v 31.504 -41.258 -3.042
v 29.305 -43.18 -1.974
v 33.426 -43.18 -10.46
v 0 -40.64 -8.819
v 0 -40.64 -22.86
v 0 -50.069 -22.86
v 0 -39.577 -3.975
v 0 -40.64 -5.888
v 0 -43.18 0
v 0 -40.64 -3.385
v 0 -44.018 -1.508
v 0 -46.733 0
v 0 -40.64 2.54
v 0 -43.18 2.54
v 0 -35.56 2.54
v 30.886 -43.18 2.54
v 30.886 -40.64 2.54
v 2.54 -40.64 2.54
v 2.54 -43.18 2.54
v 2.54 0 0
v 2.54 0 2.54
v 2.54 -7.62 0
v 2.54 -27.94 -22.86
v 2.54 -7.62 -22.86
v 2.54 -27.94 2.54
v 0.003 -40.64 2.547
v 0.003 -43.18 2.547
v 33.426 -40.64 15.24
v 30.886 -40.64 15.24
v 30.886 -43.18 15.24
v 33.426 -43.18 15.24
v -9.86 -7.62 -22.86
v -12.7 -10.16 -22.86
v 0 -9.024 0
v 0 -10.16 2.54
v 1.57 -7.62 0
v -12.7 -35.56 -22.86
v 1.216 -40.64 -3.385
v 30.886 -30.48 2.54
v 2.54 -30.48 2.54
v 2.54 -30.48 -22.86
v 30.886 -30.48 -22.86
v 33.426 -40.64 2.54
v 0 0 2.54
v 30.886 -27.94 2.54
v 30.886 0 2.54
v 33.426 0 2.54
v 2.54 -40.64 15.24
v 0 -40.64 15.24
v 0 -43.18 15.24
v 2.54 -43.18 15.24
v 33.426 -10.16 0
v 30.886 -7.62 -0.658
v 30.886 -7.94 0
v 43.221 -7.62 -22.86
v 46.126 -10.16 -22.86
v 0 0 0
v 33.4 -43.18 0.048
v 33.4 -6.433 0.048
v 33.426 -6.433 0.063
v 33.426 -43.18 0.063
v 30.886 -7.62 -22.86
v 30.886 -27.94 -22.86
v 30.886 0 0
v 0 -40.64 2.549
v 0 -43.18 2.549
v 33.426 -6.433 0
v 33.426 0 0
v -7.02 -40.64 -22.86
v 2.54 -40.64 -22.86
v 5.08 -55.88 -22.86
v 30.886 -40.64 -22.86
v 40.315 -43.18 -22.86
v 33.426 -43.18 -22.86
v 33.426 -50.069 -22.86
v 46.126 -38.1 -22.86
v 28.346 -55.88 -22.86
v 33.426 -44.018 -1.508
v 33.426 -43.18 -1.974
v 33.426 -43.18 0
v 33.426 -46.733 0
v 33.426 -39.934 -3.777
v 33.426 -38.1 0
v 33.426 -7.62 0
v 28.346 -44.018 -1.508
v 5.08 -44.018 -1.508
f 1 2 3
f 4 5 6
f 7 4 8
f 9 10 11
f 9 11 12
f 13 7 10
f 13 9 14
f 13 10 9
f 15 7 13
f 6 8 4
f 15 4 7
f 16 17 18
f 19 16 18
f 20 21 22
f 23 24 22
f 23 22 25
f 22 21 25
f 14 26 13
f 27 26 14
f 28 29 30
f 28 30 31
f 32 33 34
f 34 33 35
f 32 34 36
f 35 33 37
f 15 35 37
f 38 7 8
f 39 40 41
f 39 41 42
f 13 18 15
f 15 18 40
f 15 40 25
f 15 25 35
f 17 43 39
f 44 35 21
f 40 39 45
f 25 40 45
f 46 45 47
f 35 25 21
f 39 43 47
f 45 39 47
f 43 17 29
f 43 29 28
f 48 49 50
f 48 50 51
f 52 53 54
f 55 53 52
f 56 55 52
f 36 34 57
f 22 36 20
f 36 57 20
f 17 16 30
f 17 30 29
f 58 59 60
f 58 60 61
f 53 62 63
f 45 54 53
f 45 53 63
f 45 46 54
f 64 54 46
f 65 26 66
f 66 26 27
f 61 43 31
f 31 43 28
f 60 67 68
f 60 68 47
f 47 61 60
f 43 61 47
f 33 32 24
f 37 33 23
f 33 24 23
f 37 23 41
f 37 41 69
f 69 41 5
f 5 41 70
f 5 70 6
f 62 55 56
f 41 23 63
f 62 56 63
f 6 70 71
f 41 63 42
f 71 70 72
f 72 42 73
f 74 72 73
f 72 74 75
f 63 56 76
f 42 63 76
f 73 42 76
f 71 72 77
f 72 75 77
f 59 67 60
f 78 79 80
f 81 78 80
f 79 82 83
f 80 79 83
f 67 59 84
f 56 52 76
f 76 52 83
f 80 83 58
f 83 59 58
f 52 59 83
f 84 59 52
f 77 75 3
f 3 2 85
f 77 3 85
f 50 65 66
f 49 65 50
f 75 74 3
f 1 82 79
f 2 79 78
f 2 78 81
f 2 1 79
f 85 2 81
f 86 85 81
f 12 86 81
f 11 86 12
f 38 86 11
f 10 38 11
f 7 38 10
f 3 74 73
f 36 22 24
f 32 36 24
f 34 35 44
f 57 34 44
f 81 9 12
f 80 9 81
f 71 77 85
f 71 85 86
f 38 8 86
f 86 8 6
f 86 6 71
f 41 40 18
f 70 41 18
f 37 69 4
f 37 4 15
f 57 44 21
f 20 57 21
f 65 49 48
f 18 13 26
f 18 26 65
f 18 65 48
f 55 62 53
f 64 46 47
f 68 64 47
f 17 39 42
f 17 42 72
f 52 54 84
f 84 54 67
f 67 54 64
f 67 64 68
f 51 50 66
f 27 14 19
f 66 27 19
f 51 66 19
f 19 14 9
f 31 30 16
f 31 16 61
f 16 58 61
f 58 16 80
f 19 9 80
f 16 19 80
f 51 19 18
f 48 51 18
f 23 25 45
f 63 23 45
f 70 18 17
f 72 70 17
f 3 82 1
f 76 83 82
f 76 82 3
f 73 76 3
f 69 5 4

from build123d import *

# Parameters (mm, degrees)
F0_W          = 28.3464
F0_H          = 2.54
F0_W_2        = 2.54
F1_DEPTH      = 43.18
F2_W          = 28.3464
F2_H          = 10.16
F3_DEPTH      = 2.54
F2_W_2        = 2.54
F2_H_2        = 2.54
F4_DEPTH      = 12.7
F5_DEPTH      = 25.4
F6_W          = 33.4264
F6_H          = 22.86
F7_DEPTH      = 12.7
F9_W          = 35.56
F9_H          = 27.94
F10_DEPTH     = 25.4
F11_W         = 35.56
F11_H         = 22.86
F12_DEPTH     = 12.7
F14_W         = 36.8241928518
F14_H         = 28.1280204654
F15_DEPTH     = 25.4
F17_DEPTH     = 12.7
F19_W         = 36.3356121816
F19_H         = 38.6965835933
F20_DEPTH     = 25.4
F21_T4_DEPTH  = 37.4897748093
F21_T10_DEPTH = 37.4897748093
F22_T4_DEPTH  = 41.4622128931
F22_T9_DEPTH  = 41.4622128931
F22_T15_DEPTH = 39.215050137
F22_T21_DEPTH = 39.215050137
F22_T26_DEPTH = 13.1188216118
F23_T4_DEPTH  = 41.4622128931
F23_T9_DEPTH  = 41.4622128931
F23_T14_DEPTH = 39.215050137
F24_W         = 28.3464
F24_H         = 2.54
F25_DEPTH     = 25.4


# Not quite as in the source:
# - a fillet or chamfer that OpenCascade refuses, or shapes differently, is made with other operations: its cross-section is extruded or revolved along the edge and cut away or added


with BuildPart() as f1:
    # F0 (on Front) → F1 (new body)
    with BuildSketch(Plane.XZ):
        with Locations((16.7132, 1.27)):
            Rectangle(F0_W, F0_H)
        with Locations((1.27, 1.27)):
            Rectangle(F0_W_2, F0_H)
        with Locations((32.1564, 1.27)):
            Rectangle(F0_W_2, F0_H)
    extrude(amount=F1_DEPTH)

    # F2 (on face) → F3 (cut)
    with BuildSketch(Plane.XY.offset(2.54)):
        Polygon((30.8864, 0), (2.54, 0), (2.54, -7.62), (2.54, -27.94), (30.8864, -27.94), (30.8864, -7.62), align=None)
        with Locations((16.7132, -35.56)):
            Rectangle(F2_W, F2_H)
    extrude(amount=-F3_DEPTH, mode=Mode.SUBTRACT)

    # F2 (on face) → F4 (join)
    with BuildSketch(Plane.XY.offset(2.54)):
        with Locations((1.27, -41.91)):
            Rectangle(F2_W_2, F2_H_2)
        with Locations((32.1564, -41.91)):
            Rectangle(F2_W_2, F2_H_2)
    extrude(amount=F4_DEPTH)

    # F2 (on face) → F5 (join)
    with BuildSketch(Plane.XY.offset(2.54)):
        Polygon((2.54, -7.62), (0, -7.62), (0, -40.64), (2.54, -40.64), (2.54, -30.48), (2.54, -27.94), align=None)
        Polygon((33.4264, -7.62), (30.8864, -7.62), (30.8864, -27.94), (30.8864, -30.48), (30.8864, -40.64), (33.4264, -40.64), align=None)
        with Locations((16.7132, -41.91)):
            Rectangle(F2_W, F2_H_2)
        with Locations((1.27, -41.91)):
            Rectangle(F2_W_2, F2_H_2)
        with Locations((32.1564, -41.91)):
            Rectangle(F2_W_2, F2_H_2)
    extrude(amount=-F5_DEPTH)

    # F6 (on face) → F7 (join)
    with BuildSketch(Plane.XZ.offset(43.18)):
        with Locations((16.7132, -11.43)):
            Rectangle(F6_W, F6_H)
    extrude(amount=F7_DEPTH)

    # F9 (on 3pt) → F10 (cut)
    with BuildSketch(Plane(origin=(0, -32.9960377358, 18.3311320755), x_dir=(-1, 0, 0), z_dir=(0, 0.8741572761, -0.4856429312))):
        with Locations((-17.78, -36.665337096)):
            Rectangle(F9_W, F9_H)
    extrude(amount=-F10_DEPTH, mode=Mode.SUBTRACT)

    # F11 (on face) → F12 (join)
    with BuildSketch(Plane.YZ.offset(33.4264)):
        with Locations((-25.4, -11.43)):
            Rectangle(F11_W, F11_H)
    extrude(amount=F12_DEPTH)

    # F14 (on 3pt) → F15 (cut)
    with BuildSketch(Plane(origin=(25.5428150943, 0, 14.1904528302), x_dir=(0, -1, 0), z_dir=(-0.8741572761, 0, -0.4856429312))):
        with Locations((24.8448457569, -30.2426330745)):
            Rectangle(F14_W, F14_H)
    extrude(amount=-F15_DEPTH, mode=Mode.SUBTRACT)

    # F16 (on face) → F17 (join)
    with BuildSketch(Plane(origin=(0, 0, 0), x_dir=(0, -1, 0), z_dir=(-1, 0, 0))):
        Polygon((40.64, -22.86), (40.64, 2.54), (7.62, 2.54), (7.62, 0), (7.62, -22.86), align=None)
    extrude(amount=F17_DEPTH)

    # F19 (on 3pt) → F20 (cut)
    with BuildSketch(Plane(origin=(-1.016, 0, 0.508), x_dir=(0, -1, 0), z_dir=(-0.894427191, 0, 0.4472135955))):
        with Locations((25.5430552643, -17.0687864302)):
            Rectangle(F19_W, F19_H)
    extrude(amount=F20_DEPTH, mode=Mode.SUBTRACT)

    # F21: chamfer of 5.08 on 2 edges, made by hand


with BuildPart() as f21_tool2:
    # F21_s3 → F21_t4 (new body)
    with BuildSketch(Plane(origin=(0, -29.228474159, -52.6112534862), x_dir=(1, 0, 0), z_dir=(0, 0.4856429312, 0.8741572761))):
        with BuildLine():
            Line((-0.1436840979, -32.522427085), (5.2236840979, -37.8897952809))
            Line((5.2236840979, -37.8897952809), (5.2236840979, -37.9913952809))
            ThreePointArc((5.2236840979, -37.9913952809), (2.611842049, -37.8477111829), (0, -37.8477111829))
            Line((0, -37.8477111829), (-0.1016, -37.7461111829))
            ThreePointArc((-0.1016, -37.7461111829), (-0.1016, -35.134269134), (-0.2452840979, -32.522427085))
            Line((-0.2452840979, -32.522427085), (-0.1436840979, -32.522427085))
        make_face()
    extrude(amount=F21_T4_DEPTH)

    split(bisect_by=Plane.XY.offset(-22.86), keep=Keep.TOP)

    split(bisect_by=Plane.XZ.offset(40.64), keep=Keep.TOP)


with BuildPart() as f1_1:
    add(f1.part)

    # F21_t1: cut F21_tool2
    add(f21_tool2.part, mode=Mode.SUBTRACT)


with BuildPart() as f21_tool8:
    # F21_s9 → F21_t10 (new body)
    with BuildSketch(Plane(origin=(0, -11.0218300314, -19.8392940565), x_dir=(1, 0, 0), z_dir=(0, -0.4856429312, -0.8741572761))):
        with BuildLine():
            Line((33.5700840979, 32.522427085), (28.2027159021, 37.8897952809))
            Line((28.2027159021, 37.8897952809), (28.2027159021, 37.9913952809))
            ThreePointArc((28.2027159021, 37.9913952809), (30.814557951, 37.8477111829), (33.4264, 37.8477111829))
            Line((33.4264, 37.8477111829), (33.528, 37.7461111829))
            ThreePointArc((33.528, 37.7461111829), (33.528, 35.134269134), (33.6716840979, 32.522427085))
            Line((33.6716840979, 32.522427085), (33.5700840979, 32.522427085))
        make_face()
    extrude(amount=F21_T10_DEPTH)

    split(bisect_by=Plane.XZ.offset(43.18), keep=Keep.TOP)

    split(bisect_by=Plane.XY.offset(-22.86), keep=Keep.TOP)


with BuildPart() as f1_2:
    add(f1_1.part)

    # F21_t7: cut F21_tool8
    add(f21_tool8.part, mode=Mode.SUBTRACT)

    # F22: chamfer of 5.08 on 2 edges, made by hand


with BuildPart() as f22_tool2:
    # F22_s3 → F22_t4 (new body)
    with BuildSketch(Plane(origin=(-17.5264653053, 0, -35.0529306106), x_dir=(0, 1, 0), z_dir=(0.4472135955, 0, 0.894427191))):
        Polygon((-40.64, -3.9440774674), (-35.56, 1.1359225326), (-40.64, 1.1359225326), align=None)
    extrude(amount=F22_T4_DEPTH)

    split(bisect_by=Plane.YZ, keep=Keep.BOTTOM)


with BuildPart() as f1_3:
    add(f1_2.part)

    # F22_t1: cut F22_tool2
    add(f22_tool2.part, mode=Mode.SUBTRACT)


with BuildPart() as f22_tool7:
    # F22_s8 → F22_t9 (new body)
    with BuildSketch(Plane(origin=(-17.5264653053, 0, -35.0529306106), x_dir=(0, 1, 0), z_dir=(0.4472135955, 0, 0.894427191))):
        Polygon((-40.64, -3.9440774674), (-35.56, 1.1359225326), (-40.64, 1.1359225326), align=None)
    extrude(amount=F22_T9_DEPTH)

    split(bisect_by=Plane(origin=(-16.3330555915, -14.2776593863, 7.9320329924), x_dir=(0.6581451817, -0.7528910411, 0), z_dir=(-0.7071067812, -0.6181225378, 0.3434014099)), keep=Keep.TOP)

    split(bisect_by=Plane(origin=(0, -11.0218300314, -19.8392940565), x_dir=(1, 0, 0), z_dir=(0, -0.4856429312, -0.8741572761)), keep=Keep.TOP)


with BuildPart() as f1_4:
    add(f1_3.part)

    # F22_t6: cut F22_tool7
    add(f22_tool7.part, mode=Mode.SUBTRACT)


with BuildPart() as f22_tool13:
    # F22_s14 → F22_t15 (new body)
    with BuildSketch(Plane(origin=(26.9280968005, 0, -48.4705742409), x_dir=(0, 1, 0), z_dir=(-0.4856429312, 0, 0.8741572761))):
        Polygon((-38.1, -29.2199307745), (-43.18, -24.1399307745), (-43.18, -29.2199307745), align=None)
    extrude(amount=F22_T15_DEPTH)

    split(bisect_by=Plane(origin=(33.0462555918, -28.8876247736, 16.0486804298), x_dir=(0.6581451817, 0.7528910411, 0), z_dir=(0.7071067812, -0.6181225378, 0.3434014099)), keep=Keep.TOP)

    split(bisect_by=Plane(origin=(0, -11.0218300314, -19.8392940565), x_dir=(1, 0, 0), z_dir=(0, -0.4856429312, -0.8741572761)), keep=Keep.TOP)


with BuildPart() as f1_5:
    add(f1_4.part)

    # F22_t12: cut F22_tool13
    add(f22_tool13.part, mode=Mode.SUBTRACT)


with BuildPart() as f22_tool19:
    # F22_s20 → F22_t21 (new body)
    with BuildSketch(Plane(origin=(26.9280968005, 0, -48.4705742409), x_dir=(0, 1, 0), z_dir=(-0.4856429312, 0, 0.8741572761))):
        Polygon((-38.1, -29.2199307745), (-43.18, -24.1399307745), (-43.18, -29.2199307745), align=None)
    extrude(amount=F22_T21_DEPTH)

    split(bisect_by=Plane.YZ.offset(33.4264), keep=Keep.TOP)


with BuildPart() as f1_6:
    add(f1_5.part)

    # F22_t18: cut F22_tool19
    add(f22_tool19.part, mode=Mode.SUBTRACT)


with BuildPart() as f22_tool24:
    # F22_s25 → F22_t26 (new body)
    with BuildSketch(Plane(origin=(1.5125219245, 0, -2.7225394641), x_dir=(0, 1, 0), z_dir=(0.4856429312, 0, -0.8741572761))):
        Polygon((-38.1, 29.2199307745), (-43.18, 24.1399307745), (-43.18, 29.2199307745), align=None)
    extrude(amount=F22_T26_DEPTH)

    split(bisect_by=Plane(origin=(33.0462555918, -28.8876247736, 16.0486804298), x_dir=(0.6581451817, 0.7528910411, 0), z_dir=(0.7071067812, -0.6181225378, 0.3434014099)), keep=Keep.TOP)

    split(bisect_by=Plane(origin=(0, -11.0218300314, -19.8392940565), x_dir=(1, 0, 0), z_dir=(0, -0.4856429312, -0.8741572761)), keep=Keep.TOP)


with BuildPart() as f1_7:
    add(f1_6.part)

    # F22_t23: cut F22_tool24
    add(f22_tool24.part, mode=Mode.SUBTRACT)

    # F23: chamfer of 2.54 on 2 edges, made by hand


with BuildPart() as f23_tool2:
    # F23_s3 → F23_t4 (new body)
    with BuildSketch(Plane(origin=(3.9372326527, 0, 7.8744653053), x_dir=(0, 1, 0), z_dir=(-0.4472135955, 0, -0.894427191))):
        Polygon((-10.16, -1.1359225326), (-7.62, 1.4040774674), (-7.62, -1.1359225326), align=None)
    extrude(amount=F23_T4_DEPTH)

    split(bisect_by=Plane.XY, keep=Keep.BOTTOM)


with BuildPart() as f1_8:
    add(f1_7.part)

    # F23_t1: cut F23_tool2
    add(f23_tool2.part, mode=Mode.SUBTRACT)


with BuildPart() as f23_tool7:
    # F23_s8 → F23_t9 (new body)
    with BuildSketch(Plane(origin=(3.9372326527, 0, 7.8744653053), x_dir=(0, 1, 0), z_dir=(-0.4472135955, 0, -0.894427191))):
        Polygon((-10.16, -1.1359225326), (-7.62, 1.4040774674), (-7.62, -1.1359225326), align=None)
    extrude(amount=F23_T9_DEPTH)

    split(bisect_by=Plane.YZ, keep=Keep.BOTTOM)


with BuildPart() as f1_9:
    add(f1_8.part)

    # F23_t6: cut F23_tool7
    add(f23_tool7.part, mode=Mode.SUBTRACT)


with BuildPart() as f23_tool12:
    # F23_s13 → F23_t14 (new body)
    with BuildSketch(Plane(origin=(23.7558408531, 0, -42.7605135355), x_dir=(0, 1, 0), z_dir=(-0.4856429312, 0, 0.8741572761))):
        Polygon((-7.62, -26.6799307745), (-10.16, -29.2199307745), (-7.62, -29.2199307745), align=None)
    extrude(amount=F23_T14_DEPTH)

    split(bisect_by=Plane.XY, keep=Keep.BOTTOM)


with BuildPart() as f1_10:
    add(f1_9.part)

    # F23_t11: cut F23_tool12
    add(f23_tool12.part, mode=Mode.SUBTRACT)

    # F24 (on face) → F25 (join)
    with BuildSketch(Plane.XY.offset(2.54)):
        with Locations((16.7132, -29.21)):
            Rectangle(F24_W, F24_H)
    extrude(amount=-F25_DEPTH)


solid = f1_10.part
